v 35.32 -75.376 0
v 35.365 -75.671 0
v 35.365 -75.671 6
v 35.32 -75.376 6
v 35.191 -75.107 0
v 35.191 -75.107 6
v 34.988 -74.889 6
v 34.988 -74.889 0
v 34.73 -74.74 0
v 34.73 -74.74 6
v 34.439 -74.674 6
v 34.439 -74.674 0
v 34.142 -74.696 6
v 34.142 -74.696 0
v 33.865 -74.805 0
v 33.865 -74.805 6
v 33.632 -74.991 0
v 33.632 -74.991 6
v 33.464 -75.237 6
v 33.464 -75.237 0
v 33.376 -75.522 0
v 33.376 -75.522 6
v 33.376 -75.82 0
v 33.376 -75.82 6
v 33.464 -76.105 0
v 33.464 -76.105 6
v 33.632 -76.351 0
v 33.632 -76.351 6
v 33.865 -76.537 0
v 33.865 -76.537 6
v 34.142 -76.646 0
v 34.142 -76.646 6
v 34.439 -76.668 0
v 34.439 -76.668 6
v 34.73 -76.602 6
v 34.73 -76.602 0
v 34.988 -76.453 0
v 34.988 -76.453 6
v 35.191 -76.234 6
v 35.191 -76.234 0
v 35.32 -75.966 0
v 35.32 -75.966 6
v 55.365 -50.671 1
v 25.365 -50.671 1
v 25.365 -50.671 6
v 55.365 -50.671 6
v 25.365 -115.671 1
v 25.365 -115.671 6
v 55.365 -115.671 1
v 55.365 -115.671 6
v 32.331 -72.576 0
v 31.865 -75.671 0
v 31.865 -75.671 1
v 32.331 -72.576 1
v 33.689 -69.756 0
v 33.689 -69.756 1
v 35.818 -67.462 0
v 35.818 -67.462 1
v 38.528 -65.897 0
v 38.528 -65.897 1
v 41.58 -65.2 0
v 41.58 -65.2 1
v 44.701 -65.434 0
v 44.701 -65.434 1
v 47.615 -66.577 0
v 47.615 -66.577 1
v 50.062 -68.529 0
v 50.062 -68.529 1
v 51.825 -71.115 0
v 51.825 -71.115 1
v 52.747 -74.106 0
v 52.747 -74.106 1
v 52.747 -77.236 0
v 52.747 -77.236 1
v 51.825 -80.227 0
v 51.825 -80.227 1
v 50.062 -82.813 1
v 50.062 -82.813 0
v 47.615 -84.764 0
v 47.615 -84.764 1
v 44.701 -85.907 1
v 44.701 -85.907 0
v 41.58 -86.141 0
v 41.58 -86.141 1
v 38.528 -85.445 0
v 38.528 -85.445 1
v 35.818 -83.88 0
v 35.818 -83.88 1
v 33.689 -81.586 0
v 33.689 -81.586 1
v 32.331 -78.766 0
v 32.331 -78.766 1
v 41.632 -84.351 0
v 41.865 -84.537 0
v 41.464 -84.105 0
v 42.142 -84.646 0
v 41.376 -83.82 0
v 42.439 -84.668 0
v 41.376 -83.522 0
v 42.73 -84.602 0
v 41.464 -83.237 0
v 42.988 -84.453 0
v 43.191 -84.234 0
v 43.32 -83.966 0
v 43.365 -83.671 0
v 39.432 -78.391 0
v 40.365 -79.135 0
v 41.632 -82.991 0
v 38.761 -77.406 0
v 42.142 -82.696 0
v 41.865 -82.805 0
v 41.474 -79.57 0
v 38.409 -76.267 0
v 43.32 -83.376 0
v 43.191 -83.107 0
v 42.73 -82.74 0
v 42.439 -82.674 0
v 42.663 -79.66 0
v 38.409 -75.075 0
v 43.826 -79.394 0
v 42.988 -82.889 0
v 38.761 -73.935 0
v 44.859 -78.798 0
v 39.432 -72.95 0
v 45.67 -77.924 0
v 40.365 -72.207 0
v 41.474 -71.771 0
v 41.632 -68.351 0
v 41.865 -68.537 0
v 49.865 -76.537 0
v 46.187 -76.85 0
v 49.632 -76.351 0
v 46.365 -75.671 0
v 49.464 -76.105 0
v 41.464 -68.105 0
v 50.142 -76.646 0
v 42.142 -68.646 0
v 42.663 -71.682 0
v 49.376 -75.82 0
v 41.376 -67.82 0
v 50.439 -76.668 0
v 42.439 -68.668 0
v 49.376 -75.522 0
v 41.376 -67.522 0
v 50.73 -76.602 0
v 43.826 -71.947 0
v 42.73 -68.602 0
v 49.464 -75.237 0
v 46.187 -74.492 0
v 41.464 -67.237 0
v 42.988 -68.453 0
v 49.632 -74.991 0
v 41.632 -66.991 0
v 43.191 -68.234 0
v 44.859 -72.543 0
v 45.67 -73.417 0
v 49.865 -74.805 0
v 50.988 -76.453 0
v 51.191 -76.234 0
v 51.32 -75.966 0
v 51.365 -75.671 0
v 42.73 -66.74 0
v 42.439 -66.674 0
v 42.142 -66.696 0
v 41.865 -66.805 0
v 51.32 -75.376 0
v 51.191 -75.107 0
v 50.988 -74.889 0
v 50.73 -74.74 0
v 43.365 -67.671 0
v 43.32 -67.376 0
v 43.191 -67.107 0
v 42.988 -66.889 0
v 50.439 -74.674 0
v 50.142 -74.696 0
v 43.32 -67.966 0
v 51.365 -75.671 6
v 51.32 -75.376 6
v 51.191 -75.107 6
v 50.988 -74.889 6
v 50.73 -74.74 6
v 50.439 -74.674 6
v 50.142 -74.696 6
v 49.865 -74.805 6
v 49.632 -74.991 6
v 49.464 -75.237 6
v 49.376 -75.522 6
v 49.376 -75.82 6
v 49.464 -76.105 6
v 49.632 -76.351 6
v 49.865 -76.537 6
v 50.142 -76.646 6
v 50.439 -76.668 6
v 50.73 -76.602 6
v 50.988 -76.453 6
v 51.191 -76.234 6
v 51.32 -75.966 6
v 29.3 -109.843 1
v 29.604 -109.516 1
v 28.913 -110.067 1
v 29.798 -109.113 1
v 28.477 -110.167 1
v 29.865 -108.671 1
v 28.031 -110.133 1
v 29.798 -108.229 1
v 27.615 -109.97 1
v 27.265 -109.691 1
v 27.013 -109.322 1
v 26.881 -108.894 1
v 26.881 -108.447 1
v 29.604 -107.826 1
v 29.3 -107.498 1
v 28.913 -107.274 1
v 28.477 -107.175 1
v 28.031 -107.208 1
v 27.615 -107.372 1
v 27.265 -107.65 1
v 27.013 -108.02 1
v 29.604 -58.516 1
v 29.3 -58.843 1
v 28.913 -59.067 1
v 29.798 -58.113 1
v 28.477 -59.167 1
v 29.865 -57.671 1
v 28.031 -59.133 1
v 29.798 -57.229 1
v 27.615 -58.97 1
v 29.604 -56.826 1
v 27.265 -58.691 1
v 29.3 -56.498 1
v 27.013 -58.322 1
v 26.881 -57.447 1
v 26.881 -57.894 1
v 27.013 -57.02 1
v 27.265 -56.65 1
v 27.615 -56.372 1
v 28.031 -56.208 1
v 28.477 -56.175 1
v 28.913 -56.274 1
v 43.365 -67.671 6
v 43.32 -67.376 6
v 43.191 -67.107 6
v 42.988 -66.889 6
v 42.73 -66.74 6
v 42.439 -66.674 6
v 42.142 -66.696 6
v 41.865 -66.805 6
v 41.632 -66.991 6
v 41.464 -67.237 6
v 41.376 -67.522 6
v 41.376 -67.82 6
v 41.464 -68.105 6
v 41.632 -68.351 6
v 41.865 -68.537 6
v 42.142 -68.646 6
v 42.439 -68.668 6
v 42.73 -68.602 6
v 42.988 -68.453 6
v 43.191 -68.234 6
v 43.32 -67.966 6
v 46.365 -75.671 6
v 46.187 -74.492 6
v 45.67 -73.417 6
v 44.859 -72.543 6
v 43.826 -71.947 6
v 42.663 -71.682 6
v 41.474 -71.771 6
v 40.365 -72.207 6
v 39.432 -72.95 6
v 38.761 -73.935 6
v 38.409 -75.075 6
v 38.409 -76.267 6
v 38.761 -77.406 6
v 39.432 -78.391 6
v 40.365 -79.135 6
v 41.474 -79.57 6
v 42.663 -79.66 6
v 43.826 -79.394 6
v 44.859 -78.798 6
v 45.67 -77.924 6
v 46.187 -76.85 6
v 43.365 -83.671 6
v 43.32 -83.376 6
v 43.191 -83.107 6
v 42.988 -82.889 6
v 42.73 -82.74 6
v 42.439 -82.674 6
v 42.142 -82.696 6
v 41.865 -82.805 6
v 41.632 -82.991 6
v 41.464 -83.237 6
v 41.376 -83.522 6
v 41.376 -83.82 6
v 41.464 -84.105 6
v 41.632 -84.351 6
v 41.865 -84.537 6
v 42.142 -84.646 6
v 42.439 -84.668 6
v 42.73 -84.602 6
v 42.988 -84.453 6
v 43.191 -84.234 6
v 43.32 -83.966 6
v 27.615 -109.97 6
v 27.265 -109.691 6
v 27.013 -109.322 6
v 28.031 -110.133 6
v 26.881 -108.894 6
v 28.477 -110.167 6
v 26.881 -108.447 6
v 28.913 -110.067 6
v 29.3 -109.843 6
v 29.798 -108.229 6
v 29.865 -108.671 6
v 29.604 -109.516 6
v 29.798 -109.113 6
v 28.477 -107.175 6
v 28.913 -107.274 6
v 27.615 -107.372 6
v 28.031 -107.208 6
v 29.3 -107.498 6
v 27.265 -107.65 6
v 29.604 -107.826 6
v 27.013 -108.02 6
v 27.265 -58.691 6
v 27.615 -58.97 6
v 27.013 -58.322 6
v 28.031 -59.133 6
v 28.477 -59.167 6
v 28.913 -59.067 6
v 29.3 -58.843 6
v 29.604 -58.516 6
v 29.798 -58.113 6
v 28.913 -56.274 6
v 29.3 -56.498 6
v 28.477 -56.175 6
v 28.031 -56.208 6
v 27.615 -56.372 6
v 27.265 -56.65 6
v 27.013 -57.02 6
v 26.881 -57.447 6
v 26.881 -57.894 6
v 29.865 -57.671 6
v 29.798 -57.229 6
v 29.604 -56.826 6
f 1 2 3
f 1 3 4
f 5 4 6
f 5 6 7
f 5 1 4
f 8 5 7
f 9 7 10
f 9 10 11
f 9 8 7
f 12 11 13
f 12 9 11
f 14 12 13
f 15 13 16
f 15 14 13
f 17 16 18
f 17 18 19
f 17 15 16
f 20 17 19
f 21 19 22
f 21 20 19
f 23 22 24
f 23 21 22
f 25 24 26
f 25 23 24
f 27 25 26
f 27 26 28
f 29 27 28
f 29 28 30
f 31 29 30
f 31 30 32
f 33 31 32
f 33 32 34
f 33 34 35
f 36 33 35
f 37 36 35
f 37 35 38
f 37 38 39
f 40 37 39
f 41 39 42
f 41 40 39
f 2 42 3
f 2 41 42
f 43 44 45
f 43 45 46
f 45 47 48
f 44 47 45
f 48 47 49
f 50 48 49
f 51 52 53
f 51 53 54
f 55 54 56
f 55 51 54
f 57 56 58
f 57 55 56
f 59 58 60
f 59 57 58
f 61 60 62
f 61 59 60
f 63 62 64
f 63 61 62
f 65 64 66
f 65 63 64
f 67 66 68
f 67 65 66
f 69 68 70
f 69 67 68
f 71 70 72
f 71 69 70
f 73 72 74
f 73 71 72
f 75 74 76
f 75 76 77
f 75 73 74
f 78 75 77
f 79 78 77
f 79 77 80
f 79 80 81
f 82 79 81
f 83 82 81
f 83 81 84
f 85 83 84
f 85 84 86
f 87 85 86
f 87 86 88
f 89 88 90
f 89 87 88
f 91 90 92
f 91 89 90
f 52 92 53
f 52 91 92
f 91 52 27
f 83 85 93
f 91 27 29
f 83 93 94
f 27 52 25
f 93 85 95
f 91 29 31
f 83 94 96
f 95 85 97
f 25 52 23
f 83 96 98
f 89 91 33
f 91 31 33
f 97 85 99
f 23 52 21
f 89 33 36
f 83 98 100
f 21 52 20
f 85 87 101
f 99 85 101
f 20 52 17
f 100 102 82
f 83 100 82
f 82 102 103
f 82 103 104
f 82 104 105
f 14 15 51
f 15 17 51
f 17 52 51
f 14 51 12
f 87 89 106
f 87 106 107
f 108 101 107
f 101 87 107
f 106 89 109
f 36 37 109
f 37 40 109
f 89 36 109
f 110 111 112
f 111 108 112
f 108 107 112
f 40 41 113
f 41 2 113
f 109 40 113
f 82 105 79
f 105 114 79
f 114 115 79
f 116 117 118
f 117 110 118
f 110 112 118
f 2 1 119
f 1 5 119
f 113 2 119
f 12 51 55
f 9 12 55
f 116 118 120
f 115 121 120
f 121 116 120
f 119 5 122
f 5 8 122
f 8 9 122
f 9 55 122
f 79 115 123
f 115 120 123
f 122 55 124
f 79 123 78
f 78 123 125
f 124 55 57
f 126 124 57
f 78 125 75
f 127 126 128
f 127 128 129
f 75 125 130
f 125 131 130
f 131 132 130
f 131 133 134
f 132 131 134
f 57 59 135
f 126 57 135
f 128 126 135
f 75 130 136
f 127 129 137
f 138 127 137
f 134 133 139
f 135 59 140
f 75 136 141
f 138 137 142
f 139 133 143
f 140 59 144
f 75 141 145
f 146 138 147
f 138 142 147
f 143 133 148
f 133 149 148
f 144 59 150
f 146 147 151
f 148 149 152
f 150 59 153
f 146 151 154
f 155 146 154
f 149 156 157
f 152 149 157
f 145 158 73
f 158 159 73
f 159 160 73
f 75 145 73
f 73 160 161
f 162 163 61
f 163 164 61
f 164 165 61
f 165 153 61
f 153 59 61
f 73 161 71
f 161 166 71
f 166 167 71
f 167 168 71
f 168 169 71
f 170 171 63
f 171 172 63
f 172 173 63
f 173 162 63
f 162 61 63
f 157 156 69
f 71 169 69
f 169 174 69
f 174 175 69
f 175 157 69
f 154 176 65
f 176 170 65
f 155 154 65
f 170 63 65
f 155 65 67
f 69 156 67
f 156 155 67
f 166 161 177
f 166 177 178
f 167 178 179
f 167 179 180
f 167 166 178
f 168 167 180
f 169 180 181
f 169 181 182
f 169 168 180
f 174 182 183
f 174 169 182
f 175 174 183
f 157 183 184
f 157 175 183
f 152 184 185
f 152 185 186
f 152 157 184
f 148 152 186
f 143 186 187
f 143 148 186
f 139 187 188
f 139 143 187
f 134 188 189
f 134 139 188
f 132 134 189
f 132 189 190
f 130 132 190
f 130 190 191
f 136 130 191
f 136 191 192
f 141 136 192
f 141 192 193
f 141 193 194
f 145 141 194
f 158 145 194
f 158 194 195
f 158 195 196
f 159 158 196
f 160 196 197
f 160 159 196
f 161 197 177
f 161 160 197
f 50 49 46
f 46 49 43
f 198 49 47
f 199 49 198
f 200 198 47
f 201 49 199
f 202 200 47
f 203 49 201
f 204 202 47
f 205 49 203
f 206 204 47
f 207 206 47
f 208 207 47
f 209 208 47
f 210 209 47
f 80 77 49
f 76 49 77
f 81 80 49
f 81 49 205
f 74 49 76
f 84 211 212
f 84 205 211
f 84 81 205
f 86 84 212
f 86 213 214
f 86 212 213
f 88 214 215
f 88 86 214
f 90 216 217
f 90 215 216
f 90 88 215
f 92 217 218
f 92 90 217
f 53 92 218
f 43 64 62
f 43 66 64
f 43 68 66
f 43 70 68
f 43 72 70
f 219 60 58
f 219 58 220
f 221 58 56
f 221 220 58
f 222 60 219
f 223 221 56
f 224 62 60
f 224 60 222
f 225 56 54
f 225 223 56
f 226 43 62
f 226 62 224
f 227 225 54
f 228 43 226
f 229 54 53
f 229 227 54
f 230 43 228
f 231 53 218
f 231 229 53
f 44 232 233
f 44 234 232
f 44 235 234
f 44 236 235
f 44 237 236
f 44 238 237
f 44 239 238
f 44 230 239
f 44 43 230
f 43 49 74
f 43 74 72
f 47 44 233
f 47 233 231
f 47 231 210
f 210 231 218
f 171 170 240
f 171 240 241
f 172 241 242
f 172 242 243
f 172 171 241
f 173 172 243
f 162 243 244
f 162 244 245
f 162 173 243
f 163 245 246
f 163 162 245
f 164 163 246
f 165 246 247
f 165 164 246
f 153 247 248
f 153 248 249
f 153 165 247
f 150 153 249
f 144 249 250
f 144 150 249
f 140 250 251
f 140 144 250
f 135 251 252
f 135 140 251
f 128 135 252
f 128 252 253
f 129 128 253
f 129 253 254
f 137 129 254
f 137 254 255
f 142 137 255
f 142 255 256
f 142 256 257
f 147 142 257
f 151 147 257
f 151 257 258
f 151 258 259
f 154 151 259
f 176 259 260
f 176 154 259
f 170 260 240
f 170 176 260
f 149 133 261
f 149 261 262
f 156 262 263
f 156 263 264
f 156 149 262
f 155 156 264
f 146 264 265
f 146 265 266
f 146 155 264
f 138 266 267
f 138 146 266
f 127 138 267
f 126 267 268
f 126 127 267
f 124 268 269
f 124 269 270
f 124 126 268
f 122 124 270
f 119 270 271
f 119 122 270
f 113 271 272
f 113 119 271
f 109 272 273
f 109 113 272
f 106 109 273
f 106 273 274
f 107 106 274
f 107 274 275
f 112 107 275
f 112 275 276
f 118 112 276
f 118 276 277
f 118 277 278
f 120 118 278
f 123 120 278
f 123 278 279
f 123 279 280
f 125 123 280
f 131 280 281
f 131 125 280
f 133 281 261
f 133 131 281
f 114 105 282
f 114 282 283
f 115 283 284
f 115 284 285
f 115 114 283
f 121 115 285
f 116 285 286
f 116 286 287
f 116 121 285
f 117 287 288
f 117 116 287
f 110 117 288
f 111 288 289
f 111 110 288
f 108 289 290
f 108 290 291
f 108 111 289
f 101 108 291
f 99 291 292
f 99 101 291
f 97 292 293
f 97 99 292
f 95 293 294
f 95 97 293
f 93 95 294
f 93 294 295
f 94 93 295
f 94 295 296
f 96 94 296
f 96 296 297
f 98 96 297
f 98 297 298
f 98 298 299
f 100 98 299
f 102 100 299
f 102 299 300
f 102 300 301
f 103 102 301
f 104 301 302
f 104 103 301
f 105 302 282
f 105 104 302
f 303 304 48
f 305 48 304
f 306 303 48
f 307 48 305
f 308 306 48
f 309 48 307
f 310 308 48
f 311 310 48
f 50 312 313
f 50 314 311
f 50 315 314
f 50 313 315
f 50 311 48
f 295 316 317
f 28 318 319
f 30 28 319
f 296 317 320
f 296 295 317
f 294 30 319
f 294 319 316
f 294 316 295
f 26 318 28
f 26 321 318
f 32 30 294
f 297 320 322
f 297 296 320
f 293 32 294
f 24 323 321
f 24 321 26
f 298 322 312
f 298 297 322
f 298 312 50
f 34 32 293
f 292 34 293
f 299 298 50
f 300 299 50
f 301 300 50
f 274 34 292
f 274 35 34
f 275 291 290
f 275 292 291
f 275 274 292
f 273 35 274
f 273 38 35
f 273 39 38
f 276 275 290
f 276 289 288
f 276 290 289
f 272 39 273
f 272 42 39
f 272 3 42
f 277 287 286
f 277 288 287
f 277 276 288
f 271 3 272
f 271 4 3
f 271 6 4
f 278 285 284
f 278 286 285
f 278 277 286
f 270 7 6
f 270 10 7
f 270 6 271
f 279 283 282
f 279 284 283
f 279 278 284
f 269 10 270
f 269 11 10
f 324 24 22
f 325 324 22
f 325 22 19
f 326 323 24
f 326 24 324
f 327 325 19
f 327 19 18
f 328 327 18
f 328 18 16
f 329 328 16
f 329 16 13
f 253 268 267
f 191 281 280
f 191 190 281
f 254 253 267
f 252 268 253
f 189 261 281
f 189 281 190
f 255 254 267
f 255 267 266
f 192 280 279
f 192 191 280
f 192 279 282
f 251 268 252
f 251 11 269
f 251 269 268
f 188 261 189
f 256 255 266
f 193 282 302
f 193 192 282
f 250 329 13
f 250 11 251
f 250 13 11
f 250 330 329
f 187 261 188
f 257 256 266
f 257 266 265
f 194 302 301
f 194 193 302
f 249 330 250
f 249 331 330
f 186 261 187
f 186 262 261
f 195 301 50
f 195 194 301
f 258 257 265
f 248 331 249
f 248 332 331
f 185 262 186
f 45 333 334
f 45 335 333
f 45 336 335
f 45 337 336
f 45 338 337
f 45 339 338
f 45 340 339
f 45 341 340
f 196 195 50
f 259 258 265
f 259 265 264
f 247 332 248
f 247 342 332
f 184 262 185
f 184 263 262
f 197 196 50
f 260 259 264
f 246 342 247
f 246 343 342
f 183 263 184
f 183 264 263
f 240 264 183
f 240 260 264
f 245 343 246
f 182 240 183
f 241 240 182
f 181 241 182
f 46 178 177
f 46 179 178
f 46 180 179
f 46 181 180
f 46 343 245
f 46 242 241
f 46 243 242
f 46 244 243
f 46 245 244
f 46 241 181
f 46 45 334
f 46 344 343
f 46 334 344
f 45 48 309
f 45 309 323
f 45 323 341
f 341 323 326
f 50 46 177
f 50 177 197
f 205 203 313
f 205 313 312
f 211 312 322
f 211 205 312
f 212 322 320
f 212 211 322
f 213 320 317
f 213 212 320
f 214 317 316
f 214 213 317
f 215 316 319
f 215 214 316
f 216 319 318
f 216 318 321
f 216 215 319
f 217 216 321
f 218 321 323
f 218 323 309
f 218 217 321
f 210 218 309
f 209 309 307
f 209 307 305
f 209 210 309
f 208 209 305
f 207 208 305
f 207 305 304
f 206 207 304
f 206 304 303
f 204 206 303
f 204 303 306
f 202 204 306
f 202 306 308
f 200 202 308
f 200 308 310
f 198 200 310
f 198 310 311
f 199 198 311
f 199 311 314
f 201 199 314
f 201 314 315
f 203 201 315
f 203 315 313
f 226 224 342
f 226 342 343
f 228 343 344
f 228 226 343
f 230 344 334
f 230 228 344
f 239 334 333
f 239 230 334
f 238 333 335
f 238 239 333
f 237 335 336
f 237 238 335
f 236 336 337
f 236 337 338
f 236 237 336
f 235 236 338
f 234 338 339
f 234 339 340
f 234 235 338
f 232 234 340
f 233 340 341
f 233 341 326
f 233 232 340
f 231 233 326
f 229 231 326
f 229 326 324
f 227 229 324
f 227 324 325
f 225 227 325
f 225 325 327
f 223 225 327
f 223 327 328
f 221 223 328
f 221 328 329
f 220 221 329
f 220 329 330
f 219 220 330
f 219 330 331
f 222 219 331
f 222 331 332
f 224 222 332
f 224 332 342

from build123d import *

# Parameters (mm, degrees)
ESQUISSE1_W             = 30
ESQUISSE1_H             = 65
ESQUISSE1_R             = 1.5
ESQUISSE1_R_2           = 1
ESQUISSE1_R_3           = 4
BOSS_EXTRU_1_DEPTH      = 6
ESQUISSE5_W             = 30
ESQUISSE5_H             = 65
ESQUISSE5_R             = 10.5
ENL_V_MAT_EXTRU_4_DEPTH = 1


with BuildPart() as part:
    # Esquisse1 → Boss.-Extru.1 (new body)
    with BuildSketch(Plane.XY):
        with Locations((40.364568032, -83.170745263)):
            Rectangle(ESQUISSE1_W, ESQUISSE1_H)
        with Locations((28.364568032, -57.670745263)):
            Circle(ESQUISSE1_R, mode=Mode.SUBTRACT)
        with Locations((28.364568032, -108.670745263)):
            Circle(ESQUISSE1_R, mode=Mode.SUBTRACT)
        with Locations((34.364568032, -75.670745263)):
            Circle(ESQUISSE1_R_2, mode=Mode.SUBTRACT)
        with Locations((42.364568032, -67.670745263)):
            Circle(ESQUISSE1_R_2, mode=Mode.SUBTRACT)
        with Locations((50.364568032, -75.670745263)):
            Circle(ESQUISSE1_R_2, mode=Mode.SUBTRACT)
        with Locations((42.364568032, -83.670745263)):
            Circle(ESQUISSE1_R_2, mode=Mode.SUBTRACT)
        with Locations((42.364568032, -75.670745263)):
            Circle(ESQUISSE1_R_3, mode=Mode.SUBTRACT)
    extrude(amount=BOSS_EXTRU_1_DEPTH)

    # Esquisse5 → Enlèv. mat.-Extru.4 (cut)
    with BuildSketch(Plane(origin=(0, 0, 0), x_dir=(-1, 0, 0), z_dir=(0, 0, -1))):
        with Locations((-40.364568032, -83.170745263)):
            Rectangle(ESQUISSE5_W, ESQUISSE5_H)
        with Locations((-42.364568032, -75.670745263)):
            Circle(ESQUISSE5_R, mode=Mode.SUBTRACT)
    extrude(amount=-ENL_V_MAT_EXTRU_4_DEPTH, mode=Mode.SUBTRACT)


solid = part.part
